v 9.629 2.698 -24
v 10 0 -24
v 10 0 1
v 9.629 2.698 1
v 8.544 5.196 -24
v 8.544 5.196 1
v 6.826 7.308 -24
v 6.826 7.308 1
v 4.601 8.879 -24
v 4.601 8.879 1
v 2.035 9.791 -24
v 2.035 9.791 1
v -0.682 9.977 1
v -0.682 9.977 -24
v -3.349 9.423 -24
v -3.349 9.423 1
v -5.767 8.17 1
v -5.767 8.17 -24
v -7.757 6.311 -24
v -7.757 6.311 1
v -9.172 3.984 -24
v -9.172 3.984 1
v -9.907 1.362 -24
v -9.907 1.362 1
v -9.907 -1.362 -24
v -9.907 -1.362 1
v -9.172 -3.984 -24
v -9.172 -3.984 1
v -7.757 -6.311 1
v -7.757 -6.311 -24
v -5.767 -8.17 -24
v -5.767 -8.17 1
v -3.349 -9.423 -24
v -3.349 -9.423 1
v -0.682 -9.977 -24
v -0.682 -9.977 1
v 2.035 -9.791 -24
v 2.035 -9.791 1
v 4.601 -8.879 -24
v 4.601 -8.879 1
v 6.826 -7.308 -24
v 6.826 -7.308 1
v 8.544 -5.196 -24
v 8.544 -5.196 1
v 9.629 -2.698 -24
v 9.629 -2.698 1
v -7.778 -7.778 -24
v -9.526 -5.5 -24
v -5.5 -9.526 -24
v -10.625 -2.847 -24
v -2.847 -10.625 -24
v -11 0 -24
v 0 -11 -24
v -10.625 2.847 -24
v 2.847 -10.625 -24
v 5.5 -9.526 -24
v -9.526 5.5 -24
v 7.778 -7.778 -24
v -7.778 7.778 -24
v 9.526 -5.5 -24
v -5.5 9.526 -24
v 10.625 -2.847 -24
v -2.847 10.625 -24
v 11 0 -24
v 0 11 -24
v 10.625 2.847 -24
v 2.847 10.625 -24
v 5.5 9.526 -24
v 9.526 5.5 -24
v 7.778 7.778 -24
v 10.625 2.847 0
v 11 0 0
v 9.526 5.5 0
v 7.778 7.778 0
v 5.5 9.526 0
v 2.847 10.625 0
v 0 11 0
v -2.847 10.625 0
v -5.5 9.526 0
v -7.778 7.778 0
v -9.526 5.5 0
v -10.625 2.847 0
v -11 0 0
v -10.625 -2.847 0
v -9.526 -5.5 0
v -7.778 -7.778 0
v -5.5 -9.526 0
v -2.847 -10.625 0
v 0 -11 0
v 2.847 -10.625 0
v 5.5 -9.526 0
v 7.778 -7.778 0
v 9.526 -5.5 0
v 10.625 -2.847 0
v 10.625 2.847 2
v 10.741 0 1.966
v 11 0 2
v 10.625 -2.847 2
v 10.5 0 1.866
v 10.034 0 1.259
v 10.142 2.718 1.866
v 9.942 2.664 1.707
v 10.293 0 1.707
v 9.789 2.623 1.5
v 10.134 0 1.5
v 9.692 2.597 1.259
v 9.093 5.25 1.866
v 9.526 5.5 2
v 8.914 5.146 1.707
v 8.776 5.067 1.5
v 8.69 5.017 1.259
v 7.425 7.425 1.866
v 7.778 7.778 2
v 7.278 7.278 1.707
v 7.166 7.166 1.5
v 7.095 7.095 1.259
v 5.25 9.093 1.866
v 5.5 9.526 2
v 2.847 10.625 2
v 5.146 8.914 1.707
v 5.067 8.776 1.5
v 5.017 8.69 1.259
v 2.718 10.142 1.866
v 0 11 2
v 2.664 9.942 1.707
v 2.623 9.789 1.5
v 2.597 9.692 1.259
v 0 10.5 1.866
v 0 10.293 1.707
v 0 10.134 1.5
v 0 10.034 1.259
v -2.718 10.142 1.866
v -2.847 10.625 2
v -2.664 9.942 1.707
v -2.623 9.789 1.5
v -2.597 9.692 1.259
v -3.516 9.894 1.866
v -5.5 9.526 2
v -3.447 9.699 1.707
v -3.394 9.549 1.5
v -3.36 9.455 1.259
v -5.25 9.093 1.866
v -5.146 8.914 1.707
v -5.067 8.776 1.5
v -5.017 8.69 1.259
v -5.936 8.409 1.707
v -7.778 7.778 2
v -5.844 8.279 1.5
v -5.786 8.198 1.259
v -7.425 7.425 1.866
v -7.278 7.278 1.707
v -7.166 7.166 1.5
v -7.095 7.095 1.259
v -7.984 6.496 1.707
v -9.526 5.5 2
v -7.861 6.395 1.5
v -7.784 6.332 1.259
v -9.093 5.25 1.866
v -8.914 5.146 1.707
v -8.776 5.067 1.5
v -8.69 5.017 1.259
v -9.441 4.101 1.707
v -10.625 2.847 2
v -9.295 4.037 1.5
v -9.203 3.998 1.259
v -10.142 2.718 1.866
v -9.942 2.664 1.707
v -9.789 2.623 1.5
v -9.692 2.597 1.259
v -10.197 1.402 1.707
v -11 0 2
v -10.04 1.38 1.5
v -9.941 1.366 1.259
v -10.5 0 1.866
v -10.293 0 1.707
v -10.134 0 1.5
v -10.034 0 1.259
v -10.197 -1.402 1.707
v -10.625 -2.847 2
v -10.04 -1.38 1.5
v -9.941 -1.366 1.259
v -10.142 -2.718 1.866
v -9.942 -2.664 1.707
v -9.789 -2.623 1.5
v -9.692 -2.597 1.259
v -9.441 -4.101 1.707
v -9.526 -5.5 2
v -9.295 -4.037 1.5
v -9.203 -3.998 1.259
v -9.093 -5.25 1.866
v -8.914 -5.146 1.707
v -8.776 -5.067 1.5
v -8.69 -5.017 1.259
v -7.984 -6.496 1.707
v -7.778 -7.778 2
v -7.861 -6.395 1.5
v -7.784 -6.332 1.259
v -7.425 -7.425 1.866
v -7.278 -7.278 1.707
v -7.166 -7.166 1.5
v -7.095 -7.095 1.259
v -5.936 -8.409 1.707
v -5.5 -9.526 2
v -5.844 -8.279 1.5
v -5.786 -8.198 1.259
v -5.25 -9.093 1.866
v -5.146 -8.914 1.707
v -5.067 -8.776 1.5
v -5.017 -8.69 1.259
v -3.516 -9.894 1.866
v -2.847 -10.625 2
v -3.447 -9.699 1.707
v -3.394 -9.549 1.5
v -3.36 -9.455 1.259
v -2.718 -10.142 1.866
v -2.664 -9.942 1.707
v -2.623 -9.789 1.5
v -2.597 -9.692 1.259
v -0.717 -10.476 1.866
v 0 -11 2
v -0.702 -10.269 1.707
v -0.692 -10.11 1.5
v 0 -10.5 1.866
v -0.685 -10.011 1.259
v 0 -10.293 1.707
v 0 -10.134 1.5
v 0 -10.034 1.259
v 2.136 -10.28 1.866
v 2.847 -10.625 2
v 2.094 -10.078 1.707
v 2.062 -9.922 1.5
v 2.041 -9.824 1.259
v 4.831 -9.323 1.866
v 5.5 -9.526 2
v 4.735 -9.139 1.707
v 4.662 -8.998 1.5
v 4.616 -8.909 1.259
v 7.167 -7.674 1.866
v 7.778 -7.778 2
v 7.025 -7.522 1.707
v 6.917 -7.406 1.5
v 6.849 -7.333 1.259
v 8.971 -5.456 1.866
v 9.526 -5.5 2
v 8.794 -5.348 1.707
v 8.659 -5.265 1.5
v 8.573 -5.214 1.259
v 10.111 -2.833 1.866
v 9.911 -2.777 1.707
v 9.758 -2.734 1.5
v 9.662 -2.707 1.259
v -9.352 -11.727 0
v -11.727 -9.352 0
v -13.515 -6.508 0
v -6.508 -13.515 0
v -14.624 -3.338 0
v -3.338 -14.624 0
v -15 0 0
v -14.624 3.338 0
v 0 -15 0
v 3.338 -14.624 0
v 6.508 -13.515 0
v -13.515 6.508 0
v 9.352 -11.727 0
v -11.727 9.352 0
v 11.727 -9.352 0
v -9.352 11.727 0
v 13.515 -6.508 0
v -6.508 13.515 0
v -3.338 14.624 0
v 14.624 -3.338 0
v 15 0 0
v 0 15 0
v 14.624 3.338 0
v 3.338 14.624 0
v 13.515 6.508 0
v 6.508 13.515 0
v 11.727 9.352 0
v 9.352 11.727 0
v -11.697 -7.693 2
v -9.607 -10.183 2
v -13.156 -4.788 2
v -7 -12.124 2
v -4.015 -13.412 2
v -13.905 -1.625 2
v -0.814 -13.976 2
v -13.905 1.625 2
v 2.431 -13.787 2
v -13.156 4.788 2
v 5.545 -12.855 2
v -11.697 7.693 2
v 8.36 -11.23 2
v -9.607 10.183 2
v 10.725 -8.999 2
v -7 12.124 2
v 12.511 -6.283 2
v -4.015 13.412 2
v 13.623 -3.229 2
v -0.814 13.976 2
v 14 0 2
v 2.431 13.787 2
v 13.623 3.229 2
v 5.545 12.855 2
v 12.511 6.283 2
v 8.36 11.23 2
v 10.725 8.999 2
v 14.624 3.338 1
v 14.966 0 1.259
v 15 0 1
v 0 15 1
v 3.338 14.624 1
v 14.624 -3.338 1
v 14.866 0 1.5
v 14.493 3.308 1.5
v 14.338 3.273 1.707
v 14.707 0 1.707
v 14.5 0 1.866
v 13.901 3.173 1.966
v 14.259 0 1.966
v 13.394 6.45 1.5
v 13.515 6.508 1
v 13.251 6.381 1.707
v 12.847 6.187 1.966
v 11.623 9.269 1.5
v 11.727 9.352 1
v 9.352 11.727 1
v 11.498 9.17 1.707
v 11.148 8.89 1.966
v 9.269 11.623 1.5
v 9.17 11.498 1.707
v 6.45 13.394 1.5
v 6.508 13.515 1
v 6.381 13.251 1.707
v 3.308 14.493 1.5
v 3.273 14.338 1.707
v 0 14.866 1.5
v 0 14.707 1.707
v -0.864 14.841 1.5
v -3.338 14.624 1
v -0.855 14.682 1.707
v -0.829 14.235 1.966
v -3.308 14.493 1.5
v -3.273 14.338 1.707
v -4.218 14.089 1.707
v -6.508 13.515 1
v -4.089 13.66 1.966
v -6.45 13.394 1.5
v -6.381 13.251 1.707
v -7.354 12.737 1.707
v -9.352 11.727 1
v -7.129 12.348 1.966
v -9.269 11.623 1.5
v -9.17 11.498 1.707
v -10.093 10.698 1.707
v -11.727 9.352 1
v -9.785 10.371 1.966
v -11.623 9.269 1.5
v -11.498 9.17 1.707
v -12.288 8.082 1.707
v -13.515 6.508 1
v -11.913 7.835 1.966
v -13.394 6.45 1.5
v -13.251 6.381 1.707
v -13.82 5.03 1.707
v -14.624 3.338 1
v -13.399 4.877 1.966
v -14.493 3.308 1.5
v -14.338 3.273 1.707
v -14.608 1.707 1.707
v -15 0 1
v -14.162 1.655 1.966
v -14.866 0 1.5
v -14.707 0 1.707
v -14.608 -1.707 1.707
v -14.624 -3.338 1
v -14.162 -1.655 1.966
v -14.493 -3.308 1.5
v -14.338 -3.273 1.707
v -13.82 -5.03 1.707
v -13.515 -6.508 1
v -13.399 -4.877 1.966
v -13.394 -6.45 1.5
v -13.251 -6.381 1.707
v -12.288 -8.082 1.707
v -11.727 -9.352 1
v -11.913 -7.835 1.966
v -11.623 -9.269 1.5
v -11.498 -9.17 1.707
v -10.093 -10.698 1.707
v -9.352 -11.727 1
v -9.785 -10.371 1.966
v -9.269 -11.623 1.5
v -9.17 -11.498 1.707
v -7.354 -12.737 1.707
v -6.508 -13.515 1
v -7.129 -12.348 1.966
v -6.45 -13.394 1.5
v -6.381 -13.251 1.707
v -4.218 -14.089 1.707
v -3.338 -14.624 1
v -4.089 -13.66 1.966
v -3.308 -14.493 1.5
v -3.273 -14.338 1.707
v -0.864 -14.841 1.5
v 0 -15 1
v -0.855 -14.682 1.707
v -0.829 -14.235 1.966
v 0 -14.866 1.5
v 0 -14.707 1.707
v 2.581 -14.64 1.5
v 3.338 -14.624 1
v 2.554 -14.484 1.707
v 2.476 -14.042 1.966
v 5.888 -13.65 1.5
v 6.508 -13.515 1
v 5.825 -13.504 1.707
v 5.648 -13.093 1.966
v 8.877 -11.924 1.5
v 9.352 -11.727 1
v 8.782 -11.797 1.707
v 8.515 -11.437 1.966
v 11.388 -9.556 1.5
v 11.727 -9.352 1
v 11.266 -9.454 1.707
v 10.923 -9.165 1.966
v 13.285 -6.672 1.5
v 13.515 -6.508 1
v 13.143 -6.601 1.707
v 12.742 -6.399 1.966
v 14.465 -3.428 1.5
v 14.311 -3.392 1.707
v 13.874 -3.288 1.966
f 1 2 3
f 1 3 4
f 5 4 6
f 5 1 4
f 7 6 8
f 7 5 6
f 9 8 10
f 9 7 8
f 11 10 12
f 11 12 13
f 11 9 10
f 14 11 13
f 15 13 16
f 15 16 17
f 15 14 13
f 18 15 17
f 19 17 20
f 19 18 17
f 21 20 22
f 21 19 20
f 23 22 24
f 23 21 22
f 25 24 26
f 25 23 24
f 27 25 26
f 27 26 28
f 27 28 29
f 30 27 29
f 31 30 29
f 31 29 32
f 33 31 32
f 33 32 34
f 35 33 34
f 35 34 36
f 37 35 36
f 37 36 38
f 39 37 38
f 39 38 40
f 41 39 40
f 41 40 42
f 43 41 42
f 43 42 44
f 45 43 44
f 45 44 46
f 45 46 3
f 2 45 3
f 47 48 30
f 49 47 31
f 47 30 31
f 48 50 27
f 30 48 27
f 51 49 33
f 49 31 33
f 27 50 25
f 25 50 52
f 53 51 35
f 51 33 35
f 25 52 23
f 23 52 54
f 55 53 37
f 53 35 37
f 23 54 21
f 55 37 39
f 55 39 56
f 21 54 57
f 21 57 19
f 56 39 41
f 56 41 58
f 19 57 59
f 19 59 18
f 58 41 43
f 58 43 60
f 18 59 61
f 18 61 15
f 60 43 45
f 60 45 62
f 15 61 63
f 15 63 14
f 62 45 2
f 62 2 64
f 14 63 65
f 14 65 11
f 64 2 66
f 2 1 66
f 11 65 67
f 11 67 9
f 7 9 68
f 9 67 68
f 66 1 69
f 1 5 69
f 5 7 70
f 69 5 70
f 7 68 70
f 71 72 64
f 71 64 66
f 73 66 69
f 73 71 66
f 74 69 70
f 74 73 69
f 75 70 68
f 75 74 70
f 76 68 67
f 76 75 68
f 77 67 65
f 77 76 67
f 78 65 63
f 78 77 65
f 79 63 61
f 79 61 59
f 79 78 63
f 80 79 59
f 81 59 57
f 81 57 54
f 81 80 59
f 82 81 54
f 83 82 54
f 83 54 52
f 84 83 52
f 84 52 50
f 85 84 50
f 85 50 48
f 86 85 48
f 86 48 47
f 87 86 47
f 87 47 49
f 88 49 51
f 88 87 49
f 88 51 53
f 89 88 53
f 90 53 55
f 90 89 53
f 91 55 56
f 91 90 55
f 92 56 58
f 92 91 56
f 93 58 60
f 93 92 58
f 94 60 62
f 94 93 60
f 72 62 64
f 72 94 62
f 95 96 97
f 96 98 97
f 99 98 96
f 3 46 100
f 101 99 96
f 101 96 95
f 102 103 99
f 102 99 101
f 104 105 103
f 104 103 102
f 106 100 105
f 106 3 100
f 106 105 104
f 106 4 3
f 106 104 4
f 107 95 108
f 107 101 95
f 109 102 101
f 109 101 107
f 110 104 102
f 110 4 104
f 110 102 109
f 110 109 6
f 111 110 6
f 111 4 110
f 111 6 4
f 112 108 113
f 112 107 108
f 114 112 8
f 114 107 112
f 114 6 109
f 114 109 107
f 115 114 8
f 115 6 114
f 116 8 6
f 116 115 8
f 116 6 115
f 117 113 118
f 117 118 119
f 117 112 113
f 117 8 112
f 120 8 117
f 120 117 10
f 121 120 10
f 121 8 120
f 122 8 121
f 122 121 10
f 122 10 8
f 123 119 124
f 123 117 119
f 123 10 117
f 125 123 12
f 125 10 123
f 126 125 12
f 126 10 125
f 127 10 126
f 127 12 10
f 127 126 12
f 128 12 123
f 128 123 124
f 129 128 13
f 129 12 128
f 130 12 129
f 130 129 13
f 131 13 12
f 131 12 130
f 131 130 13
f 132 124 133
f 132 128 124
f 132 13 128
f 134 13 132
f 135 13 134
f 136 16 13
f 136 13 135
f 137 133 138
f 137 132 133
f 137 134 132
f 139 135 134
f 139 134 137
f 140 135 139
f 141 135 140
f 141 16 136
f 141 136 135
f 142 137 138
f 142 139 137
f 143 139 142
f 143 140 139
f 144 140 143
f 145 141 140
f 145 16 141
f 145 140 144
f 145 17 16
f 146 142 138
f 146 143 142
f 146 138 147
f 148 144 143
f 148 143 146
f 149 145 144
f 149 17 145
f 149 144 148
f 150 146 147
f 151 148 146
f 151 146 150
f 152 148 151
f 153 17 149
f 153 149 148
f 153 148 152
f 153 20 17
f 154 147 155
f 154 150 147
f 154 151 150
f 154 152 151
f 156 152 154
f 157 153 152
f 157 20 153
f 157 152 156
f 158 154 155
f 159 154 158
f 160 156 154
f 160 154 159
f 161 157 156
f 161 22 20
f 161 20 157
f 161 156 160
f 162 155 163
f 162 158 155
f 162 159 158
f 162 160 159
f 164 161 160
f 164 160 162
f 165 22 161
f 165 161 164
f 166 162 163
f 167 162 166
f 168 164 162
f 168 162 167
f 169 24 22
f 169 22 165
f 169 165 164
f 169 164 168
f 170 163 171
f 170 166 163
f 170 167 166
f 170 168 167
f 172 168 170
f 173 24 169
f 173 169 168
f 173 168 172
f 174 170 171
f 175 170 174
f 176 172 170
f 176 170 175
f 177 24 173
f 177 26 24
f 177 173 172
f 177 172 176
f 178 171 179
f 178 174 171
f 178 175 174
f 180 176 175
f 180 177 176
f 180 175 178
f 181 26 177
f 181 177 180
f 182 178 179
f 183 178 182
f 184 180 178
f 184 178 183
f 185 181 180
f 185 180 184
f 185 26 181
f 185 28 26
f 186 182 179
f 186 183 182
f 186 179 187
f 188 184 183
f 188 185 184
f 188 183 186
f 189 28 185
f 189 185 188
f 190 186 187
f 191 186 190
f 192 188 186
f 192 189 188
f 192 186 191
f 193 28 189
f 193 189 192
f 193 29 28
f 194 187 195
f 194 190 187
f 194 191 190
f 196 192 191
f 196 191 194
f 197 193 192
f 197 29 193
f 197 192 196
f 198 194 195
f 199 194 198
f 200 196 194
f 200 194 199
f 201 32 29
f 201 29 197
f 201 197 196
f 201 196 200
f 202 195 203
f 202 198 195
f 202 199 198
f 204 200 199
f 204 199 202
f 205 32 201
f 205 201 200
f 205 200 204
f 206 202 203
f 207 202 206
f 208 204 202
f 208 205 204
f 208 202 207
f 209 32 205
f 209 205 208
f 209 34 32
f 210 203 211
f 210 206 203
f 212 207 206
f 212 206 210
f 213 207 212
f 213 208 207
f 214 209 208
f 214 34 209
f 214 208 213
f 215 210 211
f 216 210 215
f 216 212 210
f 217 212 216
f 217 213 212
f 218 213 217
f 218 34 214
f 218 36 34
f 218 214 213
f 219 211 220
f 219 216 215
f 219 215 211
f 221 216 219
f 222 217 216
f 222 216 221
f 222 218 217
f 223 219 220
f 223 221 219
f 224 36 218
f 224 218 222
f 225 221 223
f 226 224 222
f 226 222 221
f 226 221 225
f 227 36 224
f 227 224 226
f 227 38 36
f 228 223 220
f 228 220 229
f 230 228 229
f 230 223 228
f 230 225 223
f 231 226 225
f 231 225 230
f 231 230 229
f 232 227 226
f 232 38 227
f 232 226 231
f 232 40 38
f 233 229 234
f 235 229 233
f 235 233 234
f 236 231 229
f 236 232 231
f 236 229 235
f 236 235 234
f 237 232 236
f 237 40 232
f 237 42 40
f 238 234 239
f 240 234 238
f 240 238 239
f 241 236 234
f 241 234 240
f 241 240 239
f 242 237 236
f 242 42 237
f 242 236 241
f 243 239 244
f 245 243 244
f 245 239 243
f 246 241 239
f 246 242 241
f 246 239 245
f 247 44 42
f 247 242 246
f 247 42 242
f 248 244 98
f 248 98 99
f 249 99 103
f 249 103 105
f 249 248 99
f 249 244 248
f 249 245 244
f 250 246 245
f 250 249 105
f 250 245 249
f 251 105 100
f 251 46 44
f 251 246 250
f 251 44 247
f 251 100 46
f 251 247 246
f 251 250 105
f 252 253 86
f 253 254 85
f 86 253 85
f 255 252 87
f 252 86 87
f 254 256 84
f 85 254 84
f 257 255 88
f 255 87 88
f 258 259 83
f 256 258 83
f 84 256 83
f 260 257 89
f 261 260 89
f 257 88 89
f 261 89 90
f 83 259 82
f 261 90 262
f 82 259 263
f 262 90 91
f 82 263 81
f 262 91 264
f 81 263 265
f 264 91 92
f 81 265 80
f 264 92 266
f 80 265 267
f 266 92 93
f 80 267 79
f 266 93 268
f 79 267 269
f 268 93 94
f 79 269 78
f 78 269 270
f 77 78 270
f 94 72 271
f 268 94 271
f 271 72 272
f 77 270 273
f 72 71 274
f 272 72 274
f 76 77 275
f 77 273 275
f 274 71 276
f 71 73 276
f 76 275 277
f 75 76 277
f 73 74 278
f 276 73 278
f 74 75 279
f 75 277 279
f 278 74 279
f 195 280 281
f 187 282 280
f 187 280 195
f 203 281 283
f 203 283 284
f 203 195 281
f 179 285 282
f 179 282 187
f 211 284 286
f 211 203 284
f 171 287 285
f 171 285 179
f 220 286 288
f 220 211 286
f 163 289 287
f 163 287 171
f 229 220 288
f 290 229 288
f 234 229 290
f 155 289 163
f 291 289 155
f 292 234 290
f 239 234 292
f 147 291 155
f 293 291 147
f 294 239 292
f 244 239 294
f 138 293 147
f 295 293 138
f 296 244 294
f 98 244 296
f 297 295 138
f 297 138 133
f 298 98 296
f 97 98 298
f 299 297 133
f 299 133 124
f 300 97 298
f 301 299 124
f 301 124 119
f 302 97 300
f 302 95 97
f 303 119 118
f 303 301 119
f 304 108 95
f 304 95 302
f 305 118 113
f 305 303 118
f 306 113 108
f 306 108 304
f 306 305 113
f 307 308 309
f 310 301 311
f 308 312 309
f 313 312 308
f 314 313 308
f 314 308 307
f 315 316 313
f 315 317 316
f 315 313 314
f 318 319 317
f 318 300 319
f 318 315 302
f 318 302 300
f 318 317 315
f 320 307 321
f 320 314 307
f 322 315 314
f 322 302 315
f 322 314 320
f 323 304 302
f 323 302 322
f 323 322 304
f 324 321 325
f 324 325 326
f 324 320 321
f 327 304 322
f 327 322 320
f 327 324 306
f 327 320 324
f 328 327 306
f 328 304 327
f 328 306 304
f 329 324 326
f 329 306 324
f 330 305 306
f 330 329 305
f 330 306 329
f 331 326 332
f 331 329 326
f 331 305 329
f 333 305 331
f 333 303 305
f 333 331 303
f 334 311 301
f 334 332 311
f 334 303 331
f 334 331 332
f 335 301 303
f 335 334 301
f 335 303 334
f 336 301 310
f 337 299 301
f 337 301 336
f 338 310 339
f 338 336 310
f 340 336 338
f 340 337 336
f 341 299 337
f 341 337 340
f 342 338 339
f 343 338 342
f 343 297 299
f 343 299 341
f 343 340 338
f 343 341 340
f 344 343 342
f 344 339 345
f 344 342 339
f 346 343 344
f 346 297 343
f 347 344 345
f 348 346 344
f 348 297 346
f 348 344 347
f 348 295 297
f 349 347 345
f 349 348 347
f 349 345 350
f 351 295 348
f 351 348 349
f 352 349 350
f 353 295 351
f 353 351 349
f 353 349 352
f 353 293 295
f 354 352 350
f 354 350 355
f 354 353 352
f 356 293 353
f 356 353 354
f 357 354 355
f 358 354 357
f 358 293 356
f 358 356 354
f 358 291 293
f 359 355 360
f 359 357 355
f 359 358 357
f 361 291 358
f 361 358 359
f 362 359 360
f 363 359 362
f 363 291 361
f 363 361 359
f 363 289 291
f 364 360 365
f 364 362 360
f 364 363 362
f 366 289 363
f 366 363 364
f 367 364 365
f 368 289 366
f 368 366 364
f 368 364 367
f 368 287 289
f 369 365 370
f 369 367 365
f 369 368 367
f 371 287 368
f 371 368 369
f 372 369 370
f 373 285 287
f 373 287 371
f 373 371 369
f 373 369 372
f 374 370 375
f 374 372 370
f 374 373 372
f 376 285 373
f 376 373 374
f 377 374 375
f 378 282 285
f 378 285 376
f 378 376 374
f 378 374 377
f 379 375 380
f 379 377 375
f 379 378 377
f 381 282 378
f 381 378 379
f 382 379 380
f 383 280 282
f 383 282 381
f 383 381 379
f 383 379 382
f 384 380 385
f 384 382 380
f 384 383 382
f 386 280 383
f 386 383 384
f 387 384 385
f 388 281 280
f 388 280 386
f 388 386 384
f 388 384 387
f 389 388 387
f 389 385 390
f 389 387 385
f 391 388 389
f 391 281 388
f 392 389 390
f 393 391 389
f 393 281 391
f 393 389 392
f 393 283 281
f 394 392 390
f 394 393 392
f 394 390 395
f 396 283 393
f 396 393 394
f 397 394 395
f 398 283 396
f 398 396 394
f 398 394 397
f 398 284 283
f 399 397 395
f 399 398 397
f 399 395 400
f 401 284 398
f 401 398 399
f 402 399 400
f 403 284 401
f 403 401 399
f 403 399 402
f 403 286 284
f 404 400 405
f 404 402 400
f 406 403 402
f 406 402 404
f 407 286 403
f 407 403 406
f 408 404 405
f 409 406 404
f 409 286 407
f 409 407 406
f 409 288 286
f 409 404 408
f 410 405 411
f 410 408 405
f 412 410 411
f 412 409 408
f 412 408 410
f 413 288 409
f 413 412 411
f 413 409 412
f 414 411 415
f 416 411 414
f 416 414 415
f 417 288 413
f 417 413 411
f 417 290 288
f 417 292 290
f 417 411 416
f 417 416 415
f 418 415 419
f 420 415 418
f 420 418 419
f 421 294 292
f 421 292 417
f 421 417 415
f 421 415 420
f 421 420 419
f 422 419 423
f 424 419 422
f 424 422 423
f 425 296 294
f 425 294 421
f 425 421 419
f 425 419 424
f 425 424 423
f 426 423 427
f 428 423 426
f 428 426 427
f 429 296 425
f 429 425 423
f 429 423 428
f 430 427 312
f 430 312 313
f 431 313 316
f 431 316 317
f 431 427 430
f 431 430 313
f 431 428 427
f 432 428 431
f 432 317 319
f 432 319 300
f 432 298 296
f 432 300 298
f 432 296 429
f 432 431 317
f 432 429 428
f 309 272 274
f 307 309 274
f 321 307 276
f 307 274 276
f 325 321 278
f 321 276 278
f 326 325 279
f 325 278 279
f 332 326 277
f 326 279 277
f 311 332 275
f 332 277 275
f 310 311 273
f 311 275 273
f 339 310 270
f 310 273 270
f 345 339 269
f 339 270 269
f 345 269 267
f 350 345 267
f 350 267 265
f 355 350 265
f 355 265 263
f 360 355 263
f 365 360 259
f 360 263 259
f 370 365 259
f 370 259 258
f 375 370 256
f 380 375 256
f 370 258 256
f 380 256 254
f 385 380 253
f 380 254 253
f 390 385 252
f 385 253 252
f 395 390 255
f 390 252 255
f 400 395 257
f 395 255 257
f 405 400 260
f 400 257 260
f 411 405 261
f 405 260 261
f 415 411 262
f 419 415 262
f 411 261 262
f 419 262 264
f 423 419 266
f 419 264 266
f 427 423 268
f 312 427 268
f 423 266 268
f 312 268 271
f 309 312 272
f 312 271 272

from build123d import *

# Parameters (mm, degrees)
F0_R     = 11
F0_R_2   = 10
F1_DEPTH = 24
F0_R_3   = 15
F2_DEPTH = 2
F3_R     = 1


with BuildPart() as f1:
    # F0 (on Top) → F1 (new body)
    with BuildSketch(Plane.XY):
        Circle(F0_R)
        Circle(F0_R_2, mode=Mode.SUBTRACT)
    extrude(amount=-F1_DEPTH)

    # F0 (on Top) → F2 (join)
    with BuildSketch(Plane.XY):
        Circle(F0_R_3)
        Circle(F0_R, mode=Mode.SUBTRACT)
        Circle(F0_R)
        Circle(F0_R_2, mode=Mode.SUBTRACT)
    extrude(amount=F2_DEPTH)

    # F3
    f3_edges = [f1.edges().sort_by_distance(p)[0] for p in [
        (-15, 0, 2),
        (-10, 0, 2),
    ]]
    fillet(f3_edges, radius=F3_R)


solid = f1.part
